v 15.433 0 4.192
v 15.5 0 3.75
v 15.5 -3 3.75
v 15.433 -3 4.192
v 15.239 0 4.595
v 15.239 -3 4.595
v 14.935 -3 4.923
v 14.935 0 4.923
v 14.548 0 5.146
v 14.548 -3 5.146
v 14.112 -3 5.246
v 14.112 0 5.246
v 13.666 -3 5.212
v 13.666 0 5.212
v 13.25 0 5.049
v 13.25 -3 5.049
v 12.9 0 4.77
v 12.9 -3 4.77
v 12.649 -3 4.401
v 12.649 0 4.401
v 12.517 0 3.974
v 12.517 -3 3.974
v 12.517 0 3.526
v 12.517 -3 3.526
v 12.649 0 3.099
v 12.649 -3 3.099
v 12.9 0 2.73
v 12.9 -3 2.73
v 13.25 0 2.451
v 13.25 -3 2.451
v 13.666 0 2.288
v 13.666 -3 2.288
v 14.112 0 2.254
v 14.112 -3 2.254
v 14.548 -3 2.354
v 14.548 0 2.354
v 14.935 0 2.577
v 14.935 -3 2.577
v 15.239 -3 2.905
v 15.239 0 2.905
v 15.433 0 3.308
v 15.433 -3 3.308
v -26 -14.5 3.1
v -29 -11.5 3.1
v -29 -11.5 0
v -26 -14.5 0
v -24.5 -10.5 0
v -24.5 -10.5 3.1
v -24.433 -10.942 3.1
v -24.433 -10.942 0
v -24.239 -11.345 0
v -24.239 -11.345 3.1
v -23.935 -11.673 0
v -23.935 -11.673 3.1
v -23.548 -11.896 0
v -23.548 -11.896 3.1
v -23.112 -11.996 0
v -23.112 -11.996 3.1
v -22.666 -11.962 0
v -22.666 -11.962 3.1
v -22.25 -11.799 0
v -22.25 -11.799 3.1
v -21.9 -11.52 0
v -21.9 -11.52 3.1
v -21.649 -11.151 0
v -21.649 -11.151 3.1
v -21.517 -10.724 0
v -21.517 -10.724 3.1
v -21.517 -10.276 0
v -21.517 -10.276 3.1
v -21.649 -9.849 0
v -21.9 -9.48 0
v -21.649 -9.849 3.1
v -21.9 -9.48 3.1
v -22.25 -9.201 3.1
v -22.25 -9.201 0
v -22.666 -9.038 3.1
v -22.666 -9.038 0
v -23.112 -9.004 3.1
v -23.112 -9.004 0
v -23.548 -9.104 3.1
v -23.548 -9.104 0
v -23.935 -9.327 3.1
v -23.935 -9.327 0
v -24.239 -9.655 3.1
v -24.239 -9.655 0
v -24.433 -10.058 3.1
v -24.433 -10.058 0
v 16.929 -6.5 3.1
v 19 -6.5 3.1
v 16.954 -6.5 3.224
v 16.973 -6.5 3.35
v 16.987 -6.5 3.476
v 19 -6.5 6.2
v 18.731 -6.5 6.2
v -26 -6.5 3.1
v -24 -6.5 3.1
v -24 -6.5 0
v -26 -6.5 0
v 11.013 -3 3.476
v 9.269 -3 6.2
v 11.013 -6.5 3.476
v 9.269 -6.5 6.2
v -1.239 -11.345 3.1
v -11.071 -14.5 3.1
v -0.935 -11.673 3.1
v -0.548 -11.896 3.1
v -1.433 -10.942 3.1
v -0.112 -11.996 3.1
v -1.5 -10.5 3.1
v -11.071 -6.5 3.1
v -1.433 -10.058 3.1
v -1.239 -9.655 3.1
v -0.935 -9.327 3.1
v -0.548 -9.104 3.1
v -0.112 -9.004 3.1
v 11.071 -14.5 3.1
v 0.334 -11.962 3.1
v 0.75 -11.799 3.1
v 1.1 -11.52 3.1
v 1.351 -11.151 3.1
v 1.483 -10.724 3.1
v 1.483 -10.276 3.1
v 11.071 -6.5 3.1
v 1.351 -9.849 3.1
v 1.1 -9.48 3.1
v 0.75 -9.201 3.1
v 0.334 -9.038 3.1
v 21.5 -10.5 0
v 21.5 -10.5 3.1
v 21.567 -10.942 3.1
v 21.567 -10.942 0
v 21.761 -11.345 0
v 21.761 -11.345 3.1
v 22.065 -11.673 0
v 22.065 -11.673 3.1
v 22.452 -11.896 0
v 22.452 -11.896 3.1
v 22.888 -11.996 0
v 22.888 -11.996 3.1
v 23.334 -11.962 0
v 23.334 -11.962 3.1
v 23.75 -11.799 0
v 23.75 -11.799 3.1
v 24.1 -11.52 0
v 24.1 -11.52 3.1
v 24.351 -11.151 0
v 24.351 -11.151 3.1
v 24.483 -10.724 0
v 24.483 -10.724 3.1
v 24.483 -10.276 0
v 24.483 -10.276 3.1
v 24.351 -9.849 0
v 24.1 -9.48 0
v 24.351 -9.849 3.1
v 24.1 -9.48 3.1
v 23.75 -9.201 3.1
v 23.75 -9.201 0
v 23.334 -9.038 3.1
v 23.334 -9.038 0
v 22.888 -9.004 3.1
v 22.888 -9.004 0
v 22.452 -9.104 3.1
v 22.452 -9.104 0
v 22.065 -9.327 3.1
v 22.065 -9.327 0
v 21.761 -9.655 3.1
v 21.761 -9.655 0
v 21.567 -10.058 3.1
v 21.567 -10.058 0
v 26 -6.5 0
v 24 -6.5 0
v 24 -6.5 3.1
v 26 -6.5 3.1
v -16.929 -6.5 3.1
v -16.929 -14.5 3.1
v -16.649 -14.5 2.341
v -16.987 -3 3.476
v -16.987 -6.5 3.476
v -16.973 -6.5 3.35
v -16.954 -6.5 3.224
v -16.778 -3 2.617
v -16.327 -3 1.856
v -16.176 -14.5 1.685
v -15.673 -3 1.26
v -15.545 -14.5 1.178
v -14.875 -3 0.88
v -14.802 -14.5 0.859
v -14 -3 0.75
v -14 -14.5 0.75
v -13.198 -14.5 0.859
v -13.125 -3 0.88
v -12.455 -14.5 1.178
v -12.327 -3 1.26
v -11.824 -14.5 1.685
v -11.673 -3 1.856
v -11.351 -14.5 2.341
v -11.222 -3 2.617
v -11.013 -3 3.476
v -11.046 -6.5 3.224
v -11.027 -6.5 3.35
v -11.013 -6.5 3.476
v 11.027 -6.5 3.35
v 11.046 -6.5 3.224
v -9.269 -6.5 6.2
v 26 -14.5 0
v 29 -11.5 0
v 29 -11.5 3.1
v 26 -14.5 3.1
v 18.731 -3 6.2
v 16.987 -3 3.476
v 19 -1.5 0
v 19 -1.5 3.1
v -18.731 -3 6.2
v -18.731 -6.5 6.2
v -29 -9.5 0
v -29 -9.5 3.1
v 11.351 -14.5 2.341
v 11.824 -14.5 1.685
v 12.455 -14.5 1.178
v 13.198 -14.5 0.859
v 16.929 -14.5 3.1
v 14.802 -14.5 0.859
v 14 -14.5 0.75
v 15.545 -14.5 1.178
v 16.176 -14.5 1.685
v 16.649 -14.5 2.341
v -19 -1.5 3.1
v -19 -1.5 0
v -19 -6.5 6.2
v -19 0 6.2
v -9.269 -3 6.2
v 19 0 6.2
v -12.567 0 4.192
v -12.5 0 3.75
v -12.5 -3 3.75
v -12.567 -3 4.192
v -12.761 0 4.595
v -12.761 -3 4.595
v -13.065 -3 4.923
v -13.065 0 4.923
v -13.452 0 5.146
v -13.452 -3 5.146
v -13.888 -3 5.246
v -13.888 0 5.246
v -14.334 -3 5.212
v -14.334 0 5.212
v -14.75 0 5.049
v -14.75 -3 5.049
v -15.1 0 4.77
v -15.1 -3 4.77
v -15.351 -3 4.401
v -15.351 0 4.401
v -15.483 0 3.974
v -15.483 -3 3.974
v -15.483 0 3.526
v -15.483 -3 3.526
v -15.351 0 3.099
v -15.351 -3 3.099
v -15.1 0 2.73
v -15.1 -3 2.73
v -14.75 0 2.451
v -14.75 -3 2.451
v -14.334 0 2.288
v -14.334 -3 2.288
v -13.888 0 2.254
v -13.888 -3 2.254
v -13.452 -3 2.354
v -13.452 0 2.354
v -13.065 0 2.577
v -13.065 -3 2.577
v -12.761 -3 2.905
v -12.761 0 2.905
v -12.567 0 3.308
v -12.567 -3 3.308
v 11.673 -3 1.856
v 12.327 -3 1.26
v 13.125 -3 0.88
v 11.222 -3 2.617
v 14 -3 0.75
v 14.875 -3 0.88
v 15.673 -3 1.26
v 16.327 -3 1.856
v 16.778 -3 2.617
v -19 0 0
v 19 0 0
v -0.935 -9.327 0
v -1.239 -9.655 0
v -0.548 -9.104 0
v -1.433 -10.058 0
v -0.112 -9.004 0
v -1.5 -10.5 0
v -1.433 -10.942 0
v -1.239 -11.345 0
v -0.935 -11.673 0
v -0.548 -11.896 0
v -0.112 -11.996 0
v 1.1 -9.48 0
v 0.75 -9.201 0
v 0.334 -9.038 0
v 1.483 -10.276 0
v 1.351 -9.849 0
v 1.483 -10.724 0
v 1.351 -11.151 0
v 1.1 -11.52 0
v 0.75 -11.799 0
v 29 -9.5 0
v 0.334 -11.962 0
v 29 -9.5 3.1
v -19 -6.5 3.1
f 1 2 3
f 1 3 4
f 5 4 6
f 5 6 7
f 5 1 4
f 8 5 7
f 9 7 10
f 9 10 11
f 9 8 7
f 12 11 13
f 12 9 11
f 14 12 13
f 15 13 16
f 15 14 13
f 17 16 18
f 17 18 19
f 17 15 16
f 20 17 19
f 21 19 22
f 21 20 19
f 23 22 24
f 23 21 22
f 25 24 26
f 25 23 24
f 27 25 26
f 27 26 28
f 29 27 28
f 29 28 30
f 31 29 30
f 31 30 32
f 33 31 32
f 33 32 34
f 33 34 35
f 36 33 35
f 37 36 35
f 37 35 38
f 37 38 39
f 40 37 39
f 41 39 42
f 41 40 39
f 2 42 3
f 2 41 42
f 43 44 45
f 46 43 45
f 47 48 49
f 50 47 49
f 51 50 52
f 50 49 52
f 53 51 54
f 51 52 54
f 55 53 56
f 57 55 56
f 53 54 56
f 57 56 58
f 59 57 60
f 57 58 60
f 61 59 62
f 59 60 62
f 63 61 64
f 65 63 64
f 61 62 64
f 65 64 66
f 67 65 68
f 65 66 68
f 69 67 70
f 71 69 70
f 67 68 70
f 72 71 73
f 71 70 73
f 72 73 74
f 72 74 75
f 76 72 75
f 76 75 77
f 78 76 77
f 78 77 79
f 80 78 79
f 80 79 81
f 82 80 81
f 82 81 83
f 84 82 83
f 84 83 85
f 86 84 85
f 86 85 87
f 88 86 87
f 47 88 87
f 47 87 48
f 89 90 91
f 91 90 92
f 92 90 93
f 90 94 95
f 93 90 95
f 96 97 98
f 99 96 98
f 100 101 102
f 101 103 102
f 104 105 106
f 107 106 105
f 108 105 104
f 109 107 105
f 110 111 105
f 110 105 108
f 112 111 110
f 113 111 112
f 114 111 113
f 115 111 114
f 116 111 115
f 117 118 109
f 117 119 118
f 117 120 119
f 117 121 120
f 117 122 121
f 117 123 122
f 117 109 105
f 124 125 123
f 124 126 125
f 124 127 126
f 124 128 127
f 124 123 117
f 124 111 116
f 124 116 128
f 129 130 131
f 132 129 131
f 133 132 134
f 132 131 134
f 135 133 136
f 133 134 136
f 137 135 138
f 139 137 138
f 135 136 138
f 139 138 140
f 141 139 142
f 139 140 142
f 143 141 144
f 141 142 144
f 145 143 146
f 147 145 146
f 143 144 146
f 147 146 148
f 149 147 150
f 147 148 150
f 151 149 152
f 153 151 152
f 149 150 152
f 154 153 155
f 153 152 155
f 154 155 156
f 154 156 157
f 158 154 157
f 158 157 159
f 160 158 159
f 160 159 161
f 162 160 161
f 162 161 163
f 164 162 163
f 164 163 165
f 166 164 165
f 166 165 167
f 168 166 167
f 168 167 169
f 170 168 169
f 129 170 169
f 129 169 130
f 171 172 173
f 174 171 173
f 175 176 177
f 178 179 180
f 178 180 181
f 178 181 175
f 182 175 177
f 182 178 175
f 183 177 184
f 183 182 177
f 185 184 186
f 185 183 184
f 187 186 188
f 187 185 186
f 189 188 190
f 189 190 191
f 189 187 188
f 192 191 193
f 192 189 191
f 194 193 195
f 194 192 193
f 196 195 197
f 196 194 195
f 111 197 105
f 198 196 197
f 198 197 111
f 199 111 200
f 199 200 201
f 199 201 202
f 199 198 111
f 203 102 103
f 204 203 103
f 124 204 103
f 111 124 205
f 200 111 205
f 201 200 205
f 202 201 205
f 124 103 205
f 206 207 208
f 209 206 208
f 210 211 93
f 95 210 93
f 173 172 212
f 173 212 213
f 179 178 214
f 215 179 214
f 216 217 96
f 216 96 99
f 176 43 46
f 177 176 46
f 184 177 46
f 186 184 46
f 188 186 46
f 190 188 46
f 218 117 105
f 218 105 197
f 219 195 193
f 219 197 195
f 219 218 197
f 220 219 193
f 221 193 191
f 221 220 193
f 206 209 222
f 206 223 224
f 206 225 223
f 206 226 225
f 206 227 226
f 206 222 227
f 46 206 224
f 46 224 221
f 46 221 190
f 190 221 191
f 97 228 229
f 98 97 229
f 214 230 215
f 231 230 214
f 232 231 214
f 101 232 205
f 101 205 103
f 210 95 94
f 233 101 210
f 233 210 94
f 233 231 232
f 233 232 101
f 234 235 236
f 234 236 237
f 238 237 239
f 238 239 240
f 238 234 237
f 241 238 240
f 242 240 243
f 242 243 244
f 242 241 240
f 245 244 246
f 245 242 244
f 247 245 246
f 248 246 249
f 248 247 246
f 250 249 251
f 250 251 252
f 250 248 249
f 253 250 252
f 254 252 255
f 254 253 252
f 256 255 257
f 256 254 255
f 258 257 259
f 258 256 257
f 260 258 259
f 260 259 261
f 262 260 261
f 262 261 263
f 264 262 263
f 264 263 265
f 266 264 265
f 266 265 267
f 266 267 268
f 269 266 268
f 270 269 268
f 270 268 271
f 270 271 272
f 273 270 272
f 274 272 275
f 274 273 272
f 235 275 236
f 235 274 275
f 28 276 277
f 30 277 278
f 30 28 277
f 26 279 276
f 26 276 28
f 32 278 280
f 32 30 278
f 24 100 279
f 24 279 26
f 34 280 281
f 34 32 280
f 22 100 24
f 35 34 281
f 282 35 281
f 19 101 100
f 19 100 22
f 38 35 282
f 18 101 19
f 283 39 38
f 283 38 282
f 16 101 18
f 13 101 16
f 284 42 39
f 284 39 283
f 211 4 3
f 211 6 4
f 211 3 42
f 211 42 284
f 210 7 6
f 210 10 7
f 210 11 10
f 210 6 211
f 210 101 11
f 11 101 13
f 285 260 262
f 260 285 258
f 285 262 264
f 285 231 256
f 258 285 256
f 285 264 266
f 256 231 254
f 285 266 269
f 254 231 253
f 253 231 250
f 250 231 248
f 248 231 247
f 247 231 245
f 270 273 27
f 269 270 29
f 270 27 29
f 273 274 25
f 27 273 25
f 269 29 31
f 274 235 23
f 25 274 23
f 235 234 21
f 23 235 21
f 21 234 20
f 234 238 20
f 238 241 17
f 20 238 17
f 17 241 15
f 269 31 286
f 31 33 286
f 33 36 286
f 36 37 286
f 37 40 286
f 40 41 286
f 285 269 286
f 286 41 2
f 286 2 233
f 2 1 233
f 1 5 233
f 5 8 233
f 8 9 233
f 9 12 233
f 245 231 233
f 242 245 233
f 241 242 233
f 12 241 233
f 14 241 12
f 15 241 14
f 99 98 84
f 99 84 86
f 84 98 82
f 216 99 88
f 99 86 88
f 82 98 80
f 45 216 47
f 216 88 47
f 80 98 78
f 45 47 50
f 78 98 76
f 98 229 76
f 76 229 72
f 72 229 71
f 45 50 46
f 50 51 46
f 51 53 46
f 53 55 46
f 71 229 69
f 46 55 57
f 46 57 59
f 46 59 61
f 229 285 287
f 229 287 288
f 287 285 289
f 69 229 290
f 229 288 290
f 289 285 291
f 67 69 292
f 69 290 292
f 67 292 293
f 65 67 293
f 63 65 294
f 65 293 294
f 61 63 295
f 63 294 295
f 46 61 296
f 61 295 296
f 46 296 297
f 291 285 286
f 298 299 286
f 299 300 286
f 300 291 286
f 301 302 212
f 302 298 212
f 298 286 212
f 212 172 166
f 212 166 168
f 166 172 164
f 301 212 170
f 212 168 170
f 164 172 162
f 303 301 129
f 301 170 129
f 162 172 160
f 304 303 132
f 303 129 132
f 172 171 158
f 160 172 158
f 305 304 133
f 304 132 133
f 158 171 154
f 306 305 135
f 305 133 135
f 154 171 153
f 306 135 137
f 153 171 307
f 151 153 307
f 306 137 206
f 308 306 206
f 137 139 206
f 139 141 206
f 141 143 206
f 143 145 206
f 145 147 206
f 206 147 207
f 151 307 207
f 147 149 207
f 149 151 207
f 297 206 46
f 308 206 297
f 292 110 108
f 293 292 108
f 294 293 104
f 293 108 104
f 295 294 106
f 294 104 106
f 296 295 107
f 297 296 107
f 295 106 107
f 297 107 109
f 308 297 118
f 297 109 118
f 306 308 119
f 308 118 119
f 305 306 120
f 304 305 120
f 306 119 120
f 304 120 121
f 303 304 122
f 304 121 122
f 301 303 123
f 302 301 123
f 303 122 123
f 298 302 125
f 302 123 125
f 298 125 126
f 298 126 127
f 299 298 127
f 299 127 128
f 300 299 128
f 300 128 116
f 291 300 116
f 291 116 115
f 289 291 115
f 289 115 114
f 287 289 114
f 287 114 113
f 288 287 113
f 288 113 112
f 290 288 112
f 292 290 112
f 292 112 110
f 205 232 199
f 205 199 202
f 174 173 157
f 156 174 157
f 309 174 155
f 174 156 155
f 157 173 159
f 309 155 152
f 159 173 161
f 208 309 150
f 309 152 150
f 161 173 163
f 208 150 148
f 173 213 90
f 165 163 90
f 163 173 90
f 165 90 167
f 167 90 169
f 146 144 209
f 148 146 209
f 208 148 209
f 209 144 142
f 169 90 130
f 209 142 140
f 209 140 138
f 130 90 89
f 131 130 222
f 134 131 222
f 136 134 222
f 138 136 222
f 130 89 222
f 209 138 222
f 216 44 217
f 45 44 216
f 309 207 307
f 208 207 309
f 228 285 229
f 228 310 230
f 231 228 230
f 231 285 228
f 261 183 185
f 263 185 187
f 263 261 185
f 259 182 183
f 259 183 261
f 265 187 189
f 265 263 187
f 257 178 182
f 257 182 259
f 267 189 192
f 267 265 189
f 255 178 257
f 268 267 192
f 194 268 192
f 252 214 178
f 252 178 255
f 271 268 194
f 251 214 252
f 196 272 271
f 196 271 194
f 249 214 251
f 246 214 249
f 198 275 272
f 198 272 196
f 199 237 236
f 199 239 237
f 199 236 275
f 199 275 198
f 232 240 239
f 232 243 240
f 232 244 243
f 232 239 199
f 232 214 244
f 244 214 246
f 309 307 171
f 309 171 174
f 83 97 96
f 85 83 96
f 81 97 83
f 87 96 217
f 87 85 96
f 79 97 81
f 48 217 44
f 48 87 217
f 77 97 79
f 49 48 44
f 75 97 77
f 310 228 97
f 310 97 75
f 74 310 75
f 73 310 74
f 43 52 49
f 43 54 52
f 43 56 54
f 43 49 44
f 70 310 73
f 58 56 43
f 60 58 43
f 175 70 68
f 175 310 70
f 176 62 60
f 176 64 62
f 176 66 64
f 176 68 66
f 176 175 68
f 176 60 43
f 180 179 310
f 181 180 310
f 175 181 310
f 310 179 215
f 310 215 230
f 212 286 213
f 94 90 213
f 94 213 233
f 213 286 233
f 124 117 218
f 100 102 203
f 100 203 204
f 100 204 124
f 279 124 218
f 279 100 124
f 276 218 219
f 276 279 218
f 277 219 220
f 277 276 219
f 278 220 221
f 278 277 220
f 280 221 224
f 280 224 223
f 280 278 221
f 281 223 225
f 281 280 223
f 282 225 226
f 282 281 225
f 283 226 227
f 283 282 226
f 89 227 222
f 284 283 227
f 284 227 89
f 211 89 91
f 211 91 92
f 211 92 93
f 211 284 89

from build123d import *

# Parameters (mm, degrees)
SKETCH_W        = 38
SKETCH_H        = 6.2
SKETCH_R        = 1.5
PAD_DEPTH       = 3
PAD001_DEPTH    = 3.5
PAD002_DEPTH    = 8
SKETCH003_R     = 1.5
POCKET_DEPTH    = 3.101
SKETCH004_W     = 3.1
SKETCH004_H     = 8
PAD003_DEPTH    = 10
SKETCH005_W     = 3.1
SKETCH005_H     = 8
PAD004_DEPTH    = 10
SKETCH006_R     = 1.5
POCKET001_DEPTH = 3.101
CHAMFER_SIZE    = 5
CHAMFER001_SIZE = 3
CHAMFER002_SIZE = 3


with BuildPart() as part:
    # Sketch → Pad (new body)
    with BuildSketch(Plane.XZ):
        with Locations((0, 3.1)):
            Rectangle(SKETCH_W, SKETCH_H)
        with Locations((-14, 3.75)):
            Circle(SKETCH_R, mode=Mode.SUBTRACT)
        with Locations((14, 3.75)):
            Circle(SKETCH_R, mode=Mode.SUBTRACT)
    extrude(amount=PAD_DEPTH)

    # Sketch001 (on Face8 of Pad) → Pad001 (join)
    with BuildSketch(Plane.XZ.offset(3)):
        with BuildLine():
            ThreePointArc((-15.731329, 6.2), (-14, 0.75), (-12.268671, 6.2))
            Line((-12.268671, 6.2), (12.268671, 6.2))
            ThreePointArc((12.268671, 6.2), (14, 0.75), (15.731329, 6.2))
            Line((15.731329, 6.2), (19, 6.2))
            Line((19, 6.2), (19, 0))
            Line((19, 0), (-19, 0))
            Line((-19, 0), (-19, 6.2))
            Line((-19, 6.2), (-15.731329, 6.2))
        make_face()
    extrude(amount=PAD001_DEPTH)

    # Sketch002 (on Face7 of Pad001) → Pad002 (join)
    with BuildSketch(Plane.XZ.offset(6.5)):
        with BuildLine():
            Line((-19, 0), (-19, 3.1))
            Line((-19, 3.1), (-16.928737, 3.1))
            ThreePointArc((-16.928737, 3.1), (-14, 0.75), (-11.071263, 3.1))
            Line((-11.071263, 3.1), (11.071263, 3.1))
            ThreePointArc((11.071263, 3.1), (14, 0.75), (16.928737, 3.1))
            Line((19, 3.1), (16.928737, 3.1))
            Line((19, 0), (19, 3.1))
            Line((-19, 0), (19, 0))
        make_face()
    extrude(amount=PAD002_DEPTH)

    # Sketch003 (on Face13 of Pad002) → Pocket (cut, through all)
    with BuildSketch(Plane(origin=(0, 0, 3.1), x_dir=(-1, 0, 0), z_dir=(0, 0, 1))):
        with Locations((0, 10.5)):
            Circle(SKETCH003_R)
    extrude(amount=-POCKET_DEPTH, mode=Mode.SUBTRACT)

    # Sketch004 (on Face4 of Pocket) → Pad003 (join)
    with BuildSketch(Plane(origin=(19, 0, 0), x_dir=(0, 0, 1), z_dir=(1, 0, 0))):
        with Locations((1.55, 10.5)):
            Rectangle(SKETCH004_W, SKETCH004_H)
    extrude(amount=PAD003_DEPTH)

    # Sketch005 (on Face2 of Pad003) → Pad004 (join)
    with BuildSketch(Plane(origin=(-19, 0, 0), x_dir=(0, 0, -1), z_dir=(-1, 0, 0))):
        with Locations((-1.55, 10.5)):
            Rectangle(SKETCH005_W, SKETCH005_H)
    extrude(amount=PAD004_DEPTH)

    # Sketch006 (on Face23 of Pad004) → Pocket001 (cut, through all)
    with BuildSketch(Plane(origin=(0, 0, 3.1), x_dir=(-1, 0, 0), z_dir=(0, 0, 1))):
        with Locations((-23, 10.5)):
            Circle(SKETCH006_R)
        with Locations((23, 10.5)):
            Circle(SKETCH006_R)
    extrude(amount=-POCKET001_DEPTH, mode=Mode.SUBTRACT)

    # Chamfer
    chamfer_edges = [part.edges().sort_by_distance(p)[0] for p in [
        (-19, -6.5, 1.55),
        (19, -6.5, 1.55),
    ]]
    chamfer(chamfer_edges, length=CHAMFER_SIZE)

    # Chamfer001
    chamfer001_edges = [part.edges().sort_by_distance(p)[0] for p in [
        (-29, -6.5, 1.55),
        (29, -6.5, 1.55),
        (-29, -14.5, 1.55),
        (29, -14.5, 1.55),
    ]]
    chamfer(chamfer001_edges, length=CHAMFER001_SIZE)

    # Chamfer002
    chamfer002_edges = [part.edges().sort_by_distance(p)[0] for p in [
        (-12.268671, -4.75, 6.2),
        (-15.731329, -4.75, 6.2),
        (12.268671, -4.75, 6.2),
        (15.731329, -4.75, 6.2),
    ]]
    chamfer(chamfer002_edges, length=CHAMFER002_SIZE)


solid = part.part
